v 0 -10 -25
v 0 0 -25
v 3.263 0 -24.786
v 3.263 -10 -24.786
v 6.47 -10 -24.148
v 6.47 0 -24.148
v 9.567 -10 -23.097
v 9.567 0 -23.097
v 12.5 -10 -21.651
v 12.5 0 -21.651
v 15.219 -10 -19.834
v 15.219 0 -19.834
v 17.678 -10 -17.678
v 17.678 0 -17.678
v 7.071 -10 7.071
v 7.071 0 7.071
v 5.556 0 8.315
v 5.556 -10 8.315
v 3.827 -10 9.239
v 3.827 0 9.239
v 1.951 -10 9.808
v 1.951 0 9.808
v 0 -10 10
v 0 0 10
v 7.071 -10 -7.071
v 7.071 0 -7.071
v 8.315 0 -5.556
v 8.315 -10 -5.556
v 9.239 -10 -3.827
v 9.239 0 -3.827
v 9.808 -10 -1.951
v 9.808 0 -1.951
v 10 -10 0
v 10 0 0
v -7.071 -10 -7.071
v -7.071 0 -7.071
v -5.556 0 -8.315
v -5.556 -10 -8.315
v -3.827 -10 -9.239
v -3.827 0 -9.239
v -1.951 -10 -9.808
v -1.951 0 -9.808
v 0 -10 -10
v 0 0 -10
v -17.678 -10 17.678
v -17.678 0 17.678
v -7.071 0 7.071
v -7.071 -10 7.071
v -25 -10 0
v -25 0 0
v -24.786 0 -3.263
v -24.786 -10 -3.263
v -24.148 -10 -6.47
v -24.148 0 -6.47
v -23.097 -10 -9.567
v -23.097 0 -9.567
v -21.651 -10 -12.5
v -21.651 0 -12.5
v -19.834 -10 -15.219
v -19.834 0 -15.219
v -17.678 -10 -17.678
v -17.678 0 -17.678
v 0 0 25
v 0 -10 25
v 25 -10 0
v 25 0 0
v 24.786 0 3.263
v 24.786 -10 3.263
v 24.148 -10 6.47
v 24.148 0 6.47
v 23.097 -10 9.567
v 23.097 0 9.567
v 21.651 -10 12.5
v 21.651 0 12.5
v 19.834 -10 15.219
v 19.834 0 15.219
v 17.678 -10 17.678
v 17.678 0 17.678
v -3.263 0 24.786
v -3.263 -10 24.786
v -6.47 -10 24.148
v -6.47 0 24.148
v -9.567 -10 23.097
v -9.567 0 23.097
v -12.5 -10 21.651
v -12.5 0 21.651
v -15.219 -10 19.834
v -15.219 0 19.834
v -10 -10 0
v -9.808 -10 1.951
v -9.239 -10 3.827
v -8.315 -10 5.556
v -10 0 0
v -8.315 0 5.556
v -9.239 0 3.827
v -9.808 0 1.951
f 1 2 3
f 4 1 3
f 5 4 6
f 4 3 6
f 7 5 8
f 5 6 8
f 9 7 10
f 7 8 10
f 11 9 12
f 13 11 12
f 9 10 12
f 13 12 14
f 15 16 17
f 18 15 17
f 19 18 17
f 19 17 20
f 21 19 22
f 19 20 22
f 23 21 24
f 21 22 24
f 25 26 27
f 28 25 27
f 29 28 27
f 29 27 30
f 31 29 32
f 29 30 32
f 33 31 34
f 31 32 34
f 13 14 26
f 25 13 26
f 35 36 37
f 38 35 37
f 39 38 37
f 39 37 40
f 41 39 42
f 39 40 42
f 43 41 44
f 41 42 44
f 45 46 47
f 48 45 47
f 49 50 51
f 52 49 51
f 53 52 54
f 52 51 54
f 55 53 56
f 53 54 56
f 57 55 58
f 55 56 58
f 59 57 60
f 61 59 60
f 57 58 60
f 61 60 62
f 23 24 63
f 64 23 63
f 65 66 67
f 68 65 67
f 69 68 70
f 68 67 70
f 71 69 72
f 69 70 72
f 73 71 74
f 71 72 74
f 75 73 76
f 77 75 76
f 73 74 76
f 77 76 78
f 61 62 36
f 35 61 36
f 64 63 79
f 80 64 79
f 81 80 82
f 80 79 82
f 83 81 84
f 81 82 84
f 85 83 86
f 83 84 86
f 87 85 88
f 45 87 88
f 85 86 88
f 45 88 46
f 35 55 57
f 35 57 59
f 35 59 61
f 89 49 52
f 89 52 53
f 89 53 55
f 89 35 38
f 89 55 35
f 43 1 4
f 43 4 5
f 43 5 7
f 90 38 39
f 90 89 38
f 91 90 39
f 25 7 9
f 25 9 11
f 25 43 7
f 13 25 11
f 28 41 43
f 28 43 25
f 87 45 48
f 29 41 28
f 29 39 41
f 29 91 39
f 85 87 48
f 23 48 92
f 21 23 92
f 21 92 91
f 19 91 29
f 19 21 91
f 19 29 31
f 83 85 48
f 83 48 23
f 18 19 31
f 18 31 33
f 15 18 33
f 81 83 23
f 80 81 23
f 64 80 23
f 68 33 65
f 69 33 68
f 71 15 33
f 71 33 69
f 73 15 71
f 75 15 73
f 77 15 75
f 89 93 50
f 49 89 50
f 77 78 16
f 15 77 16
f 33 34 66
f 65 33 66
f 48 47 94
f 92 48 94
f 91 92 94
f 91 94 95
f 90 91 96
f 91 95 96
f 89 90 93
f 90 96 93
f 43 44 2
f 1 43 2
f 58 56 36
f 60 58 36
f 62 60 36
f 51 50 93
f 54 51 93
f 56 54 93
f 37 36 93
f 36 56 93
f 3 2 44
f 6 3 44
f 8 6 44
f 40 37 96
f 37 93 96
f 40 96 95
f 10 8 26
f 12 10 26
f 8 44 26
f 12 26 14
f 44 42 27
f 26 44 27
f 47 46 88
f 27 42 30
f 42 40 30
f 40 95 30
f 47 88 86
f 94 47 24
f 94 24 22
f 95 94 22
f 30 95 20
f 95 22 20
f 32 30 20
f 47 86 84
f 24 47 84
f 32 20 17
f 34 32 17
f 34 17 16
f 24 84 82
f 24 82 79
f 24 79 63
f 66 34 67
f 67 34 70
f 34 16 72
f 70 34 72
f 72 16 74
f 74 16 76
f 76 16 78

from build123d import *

# Parameters (mm, degrees)
F1_DEPTH = 10


with BuildPart() as f1:
    # F0 (on Front) → F1 (new body)
    with BuildSketch(Plane.XZ):
        with BuildLine():
            Line((-10, 0), (-25, 0))
            ThreePointArc((-25, 0), (-23.096988, -9.567086), (-17.67767, -17.67767))
            Line((-17.67767, -17.67767), (-7.071068, -7.071068))
            ThreePointArc((-7.071068, -7.071068), (-3.826834, -9.238795), (0, -10))
            Line((0, -10), (0, -25))
            ThreePointArc((0, -25), (9.567086, -23.096988), (17.67767, -17.67767))
            Line((17.67767, -17.67767), (7.071068, -7.071068))
            ThreePointArc((7.071068, -7.071068), (9.238795, -3.826834), (10, 0))
            Line((10, 0), (25, 0))
            ThreePointArc((25, 0), (23.096988, 9.567086), (17.67767, 17.67767))
            Line((17.67767, 17.67767), (7.071068, 7.071068))
            ThreePointArc((7.071068, 7.071068), (3.826834, 9.238795), (0, 10))
            Line((0, 10), (0, 25))
            ThreePointArc((0, 25), (-9.567086, 23.096988), (-17.67767, 17.67767))
            Line((-17.67767, 17.67767), (-7.071068, 7.071068))
            ThreePointArc((-7.071068, 7.071068), (-9.238795, 3.826834), (-10, 0))
        make_face()
    extrude(amount=F1_DEPTH)


solid = f1.part
